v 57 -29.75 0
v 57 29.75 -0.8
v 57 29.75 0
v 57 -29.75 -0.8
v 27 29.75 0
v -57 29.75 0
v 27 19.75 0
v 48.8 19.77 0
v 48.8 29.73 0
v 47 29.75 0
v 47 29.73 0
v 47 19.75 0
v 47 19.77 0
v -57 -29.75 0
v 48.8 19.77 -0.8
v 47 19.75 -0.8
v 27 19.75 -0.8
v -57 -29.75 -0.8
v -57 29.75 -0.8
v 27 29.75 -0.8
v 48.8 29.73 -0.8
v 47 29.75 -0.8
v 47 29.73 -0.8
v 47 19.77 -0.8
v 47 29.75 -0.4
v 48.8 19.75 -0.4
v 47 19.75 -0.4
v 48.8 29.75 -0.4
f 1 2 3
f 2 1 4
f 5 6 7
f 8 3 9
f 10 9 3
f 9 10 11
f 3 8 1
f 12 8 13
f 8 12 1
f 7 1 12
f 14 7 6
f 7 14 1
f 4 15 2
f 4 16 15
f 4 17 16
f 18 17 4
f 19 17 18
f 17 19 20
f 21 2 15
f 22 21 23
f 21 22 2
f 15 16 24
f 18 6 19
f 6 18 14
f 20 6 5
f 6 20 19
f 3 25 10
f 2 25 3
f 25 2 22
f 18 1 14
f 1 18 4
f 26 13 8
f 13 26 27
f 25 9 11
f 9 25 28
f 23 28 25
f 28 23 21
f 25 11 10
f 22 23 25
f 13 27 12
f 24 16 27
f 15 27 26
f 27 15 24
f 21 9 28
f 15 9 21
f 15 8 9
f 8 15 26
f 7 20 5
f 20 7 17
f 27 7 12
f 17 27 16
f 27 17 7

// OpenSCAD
module obround_slot(length, width, height, slot_length, slot_width, slot_offset_x, slot_offset_y) {
    difference() {
        cube([length, width, height], center = true);
        translate([slot_offset_x, slot_offset_y, 0])
            rotate([0, 90, 0])
            cylinder(h = height + 1, r = slot_width / 2, $fn = 64);
        translate([slot_offset_x - slot_length / 2, slot_offset_y, 0])
            cube([slot_length, slot_width, height + 1], center = true);
    }
}

translate([0, 0, -0.4])
    obround_slot(114.0, 59.5, 0.8, 20.0, 10.0, 47.0, 24.75);
